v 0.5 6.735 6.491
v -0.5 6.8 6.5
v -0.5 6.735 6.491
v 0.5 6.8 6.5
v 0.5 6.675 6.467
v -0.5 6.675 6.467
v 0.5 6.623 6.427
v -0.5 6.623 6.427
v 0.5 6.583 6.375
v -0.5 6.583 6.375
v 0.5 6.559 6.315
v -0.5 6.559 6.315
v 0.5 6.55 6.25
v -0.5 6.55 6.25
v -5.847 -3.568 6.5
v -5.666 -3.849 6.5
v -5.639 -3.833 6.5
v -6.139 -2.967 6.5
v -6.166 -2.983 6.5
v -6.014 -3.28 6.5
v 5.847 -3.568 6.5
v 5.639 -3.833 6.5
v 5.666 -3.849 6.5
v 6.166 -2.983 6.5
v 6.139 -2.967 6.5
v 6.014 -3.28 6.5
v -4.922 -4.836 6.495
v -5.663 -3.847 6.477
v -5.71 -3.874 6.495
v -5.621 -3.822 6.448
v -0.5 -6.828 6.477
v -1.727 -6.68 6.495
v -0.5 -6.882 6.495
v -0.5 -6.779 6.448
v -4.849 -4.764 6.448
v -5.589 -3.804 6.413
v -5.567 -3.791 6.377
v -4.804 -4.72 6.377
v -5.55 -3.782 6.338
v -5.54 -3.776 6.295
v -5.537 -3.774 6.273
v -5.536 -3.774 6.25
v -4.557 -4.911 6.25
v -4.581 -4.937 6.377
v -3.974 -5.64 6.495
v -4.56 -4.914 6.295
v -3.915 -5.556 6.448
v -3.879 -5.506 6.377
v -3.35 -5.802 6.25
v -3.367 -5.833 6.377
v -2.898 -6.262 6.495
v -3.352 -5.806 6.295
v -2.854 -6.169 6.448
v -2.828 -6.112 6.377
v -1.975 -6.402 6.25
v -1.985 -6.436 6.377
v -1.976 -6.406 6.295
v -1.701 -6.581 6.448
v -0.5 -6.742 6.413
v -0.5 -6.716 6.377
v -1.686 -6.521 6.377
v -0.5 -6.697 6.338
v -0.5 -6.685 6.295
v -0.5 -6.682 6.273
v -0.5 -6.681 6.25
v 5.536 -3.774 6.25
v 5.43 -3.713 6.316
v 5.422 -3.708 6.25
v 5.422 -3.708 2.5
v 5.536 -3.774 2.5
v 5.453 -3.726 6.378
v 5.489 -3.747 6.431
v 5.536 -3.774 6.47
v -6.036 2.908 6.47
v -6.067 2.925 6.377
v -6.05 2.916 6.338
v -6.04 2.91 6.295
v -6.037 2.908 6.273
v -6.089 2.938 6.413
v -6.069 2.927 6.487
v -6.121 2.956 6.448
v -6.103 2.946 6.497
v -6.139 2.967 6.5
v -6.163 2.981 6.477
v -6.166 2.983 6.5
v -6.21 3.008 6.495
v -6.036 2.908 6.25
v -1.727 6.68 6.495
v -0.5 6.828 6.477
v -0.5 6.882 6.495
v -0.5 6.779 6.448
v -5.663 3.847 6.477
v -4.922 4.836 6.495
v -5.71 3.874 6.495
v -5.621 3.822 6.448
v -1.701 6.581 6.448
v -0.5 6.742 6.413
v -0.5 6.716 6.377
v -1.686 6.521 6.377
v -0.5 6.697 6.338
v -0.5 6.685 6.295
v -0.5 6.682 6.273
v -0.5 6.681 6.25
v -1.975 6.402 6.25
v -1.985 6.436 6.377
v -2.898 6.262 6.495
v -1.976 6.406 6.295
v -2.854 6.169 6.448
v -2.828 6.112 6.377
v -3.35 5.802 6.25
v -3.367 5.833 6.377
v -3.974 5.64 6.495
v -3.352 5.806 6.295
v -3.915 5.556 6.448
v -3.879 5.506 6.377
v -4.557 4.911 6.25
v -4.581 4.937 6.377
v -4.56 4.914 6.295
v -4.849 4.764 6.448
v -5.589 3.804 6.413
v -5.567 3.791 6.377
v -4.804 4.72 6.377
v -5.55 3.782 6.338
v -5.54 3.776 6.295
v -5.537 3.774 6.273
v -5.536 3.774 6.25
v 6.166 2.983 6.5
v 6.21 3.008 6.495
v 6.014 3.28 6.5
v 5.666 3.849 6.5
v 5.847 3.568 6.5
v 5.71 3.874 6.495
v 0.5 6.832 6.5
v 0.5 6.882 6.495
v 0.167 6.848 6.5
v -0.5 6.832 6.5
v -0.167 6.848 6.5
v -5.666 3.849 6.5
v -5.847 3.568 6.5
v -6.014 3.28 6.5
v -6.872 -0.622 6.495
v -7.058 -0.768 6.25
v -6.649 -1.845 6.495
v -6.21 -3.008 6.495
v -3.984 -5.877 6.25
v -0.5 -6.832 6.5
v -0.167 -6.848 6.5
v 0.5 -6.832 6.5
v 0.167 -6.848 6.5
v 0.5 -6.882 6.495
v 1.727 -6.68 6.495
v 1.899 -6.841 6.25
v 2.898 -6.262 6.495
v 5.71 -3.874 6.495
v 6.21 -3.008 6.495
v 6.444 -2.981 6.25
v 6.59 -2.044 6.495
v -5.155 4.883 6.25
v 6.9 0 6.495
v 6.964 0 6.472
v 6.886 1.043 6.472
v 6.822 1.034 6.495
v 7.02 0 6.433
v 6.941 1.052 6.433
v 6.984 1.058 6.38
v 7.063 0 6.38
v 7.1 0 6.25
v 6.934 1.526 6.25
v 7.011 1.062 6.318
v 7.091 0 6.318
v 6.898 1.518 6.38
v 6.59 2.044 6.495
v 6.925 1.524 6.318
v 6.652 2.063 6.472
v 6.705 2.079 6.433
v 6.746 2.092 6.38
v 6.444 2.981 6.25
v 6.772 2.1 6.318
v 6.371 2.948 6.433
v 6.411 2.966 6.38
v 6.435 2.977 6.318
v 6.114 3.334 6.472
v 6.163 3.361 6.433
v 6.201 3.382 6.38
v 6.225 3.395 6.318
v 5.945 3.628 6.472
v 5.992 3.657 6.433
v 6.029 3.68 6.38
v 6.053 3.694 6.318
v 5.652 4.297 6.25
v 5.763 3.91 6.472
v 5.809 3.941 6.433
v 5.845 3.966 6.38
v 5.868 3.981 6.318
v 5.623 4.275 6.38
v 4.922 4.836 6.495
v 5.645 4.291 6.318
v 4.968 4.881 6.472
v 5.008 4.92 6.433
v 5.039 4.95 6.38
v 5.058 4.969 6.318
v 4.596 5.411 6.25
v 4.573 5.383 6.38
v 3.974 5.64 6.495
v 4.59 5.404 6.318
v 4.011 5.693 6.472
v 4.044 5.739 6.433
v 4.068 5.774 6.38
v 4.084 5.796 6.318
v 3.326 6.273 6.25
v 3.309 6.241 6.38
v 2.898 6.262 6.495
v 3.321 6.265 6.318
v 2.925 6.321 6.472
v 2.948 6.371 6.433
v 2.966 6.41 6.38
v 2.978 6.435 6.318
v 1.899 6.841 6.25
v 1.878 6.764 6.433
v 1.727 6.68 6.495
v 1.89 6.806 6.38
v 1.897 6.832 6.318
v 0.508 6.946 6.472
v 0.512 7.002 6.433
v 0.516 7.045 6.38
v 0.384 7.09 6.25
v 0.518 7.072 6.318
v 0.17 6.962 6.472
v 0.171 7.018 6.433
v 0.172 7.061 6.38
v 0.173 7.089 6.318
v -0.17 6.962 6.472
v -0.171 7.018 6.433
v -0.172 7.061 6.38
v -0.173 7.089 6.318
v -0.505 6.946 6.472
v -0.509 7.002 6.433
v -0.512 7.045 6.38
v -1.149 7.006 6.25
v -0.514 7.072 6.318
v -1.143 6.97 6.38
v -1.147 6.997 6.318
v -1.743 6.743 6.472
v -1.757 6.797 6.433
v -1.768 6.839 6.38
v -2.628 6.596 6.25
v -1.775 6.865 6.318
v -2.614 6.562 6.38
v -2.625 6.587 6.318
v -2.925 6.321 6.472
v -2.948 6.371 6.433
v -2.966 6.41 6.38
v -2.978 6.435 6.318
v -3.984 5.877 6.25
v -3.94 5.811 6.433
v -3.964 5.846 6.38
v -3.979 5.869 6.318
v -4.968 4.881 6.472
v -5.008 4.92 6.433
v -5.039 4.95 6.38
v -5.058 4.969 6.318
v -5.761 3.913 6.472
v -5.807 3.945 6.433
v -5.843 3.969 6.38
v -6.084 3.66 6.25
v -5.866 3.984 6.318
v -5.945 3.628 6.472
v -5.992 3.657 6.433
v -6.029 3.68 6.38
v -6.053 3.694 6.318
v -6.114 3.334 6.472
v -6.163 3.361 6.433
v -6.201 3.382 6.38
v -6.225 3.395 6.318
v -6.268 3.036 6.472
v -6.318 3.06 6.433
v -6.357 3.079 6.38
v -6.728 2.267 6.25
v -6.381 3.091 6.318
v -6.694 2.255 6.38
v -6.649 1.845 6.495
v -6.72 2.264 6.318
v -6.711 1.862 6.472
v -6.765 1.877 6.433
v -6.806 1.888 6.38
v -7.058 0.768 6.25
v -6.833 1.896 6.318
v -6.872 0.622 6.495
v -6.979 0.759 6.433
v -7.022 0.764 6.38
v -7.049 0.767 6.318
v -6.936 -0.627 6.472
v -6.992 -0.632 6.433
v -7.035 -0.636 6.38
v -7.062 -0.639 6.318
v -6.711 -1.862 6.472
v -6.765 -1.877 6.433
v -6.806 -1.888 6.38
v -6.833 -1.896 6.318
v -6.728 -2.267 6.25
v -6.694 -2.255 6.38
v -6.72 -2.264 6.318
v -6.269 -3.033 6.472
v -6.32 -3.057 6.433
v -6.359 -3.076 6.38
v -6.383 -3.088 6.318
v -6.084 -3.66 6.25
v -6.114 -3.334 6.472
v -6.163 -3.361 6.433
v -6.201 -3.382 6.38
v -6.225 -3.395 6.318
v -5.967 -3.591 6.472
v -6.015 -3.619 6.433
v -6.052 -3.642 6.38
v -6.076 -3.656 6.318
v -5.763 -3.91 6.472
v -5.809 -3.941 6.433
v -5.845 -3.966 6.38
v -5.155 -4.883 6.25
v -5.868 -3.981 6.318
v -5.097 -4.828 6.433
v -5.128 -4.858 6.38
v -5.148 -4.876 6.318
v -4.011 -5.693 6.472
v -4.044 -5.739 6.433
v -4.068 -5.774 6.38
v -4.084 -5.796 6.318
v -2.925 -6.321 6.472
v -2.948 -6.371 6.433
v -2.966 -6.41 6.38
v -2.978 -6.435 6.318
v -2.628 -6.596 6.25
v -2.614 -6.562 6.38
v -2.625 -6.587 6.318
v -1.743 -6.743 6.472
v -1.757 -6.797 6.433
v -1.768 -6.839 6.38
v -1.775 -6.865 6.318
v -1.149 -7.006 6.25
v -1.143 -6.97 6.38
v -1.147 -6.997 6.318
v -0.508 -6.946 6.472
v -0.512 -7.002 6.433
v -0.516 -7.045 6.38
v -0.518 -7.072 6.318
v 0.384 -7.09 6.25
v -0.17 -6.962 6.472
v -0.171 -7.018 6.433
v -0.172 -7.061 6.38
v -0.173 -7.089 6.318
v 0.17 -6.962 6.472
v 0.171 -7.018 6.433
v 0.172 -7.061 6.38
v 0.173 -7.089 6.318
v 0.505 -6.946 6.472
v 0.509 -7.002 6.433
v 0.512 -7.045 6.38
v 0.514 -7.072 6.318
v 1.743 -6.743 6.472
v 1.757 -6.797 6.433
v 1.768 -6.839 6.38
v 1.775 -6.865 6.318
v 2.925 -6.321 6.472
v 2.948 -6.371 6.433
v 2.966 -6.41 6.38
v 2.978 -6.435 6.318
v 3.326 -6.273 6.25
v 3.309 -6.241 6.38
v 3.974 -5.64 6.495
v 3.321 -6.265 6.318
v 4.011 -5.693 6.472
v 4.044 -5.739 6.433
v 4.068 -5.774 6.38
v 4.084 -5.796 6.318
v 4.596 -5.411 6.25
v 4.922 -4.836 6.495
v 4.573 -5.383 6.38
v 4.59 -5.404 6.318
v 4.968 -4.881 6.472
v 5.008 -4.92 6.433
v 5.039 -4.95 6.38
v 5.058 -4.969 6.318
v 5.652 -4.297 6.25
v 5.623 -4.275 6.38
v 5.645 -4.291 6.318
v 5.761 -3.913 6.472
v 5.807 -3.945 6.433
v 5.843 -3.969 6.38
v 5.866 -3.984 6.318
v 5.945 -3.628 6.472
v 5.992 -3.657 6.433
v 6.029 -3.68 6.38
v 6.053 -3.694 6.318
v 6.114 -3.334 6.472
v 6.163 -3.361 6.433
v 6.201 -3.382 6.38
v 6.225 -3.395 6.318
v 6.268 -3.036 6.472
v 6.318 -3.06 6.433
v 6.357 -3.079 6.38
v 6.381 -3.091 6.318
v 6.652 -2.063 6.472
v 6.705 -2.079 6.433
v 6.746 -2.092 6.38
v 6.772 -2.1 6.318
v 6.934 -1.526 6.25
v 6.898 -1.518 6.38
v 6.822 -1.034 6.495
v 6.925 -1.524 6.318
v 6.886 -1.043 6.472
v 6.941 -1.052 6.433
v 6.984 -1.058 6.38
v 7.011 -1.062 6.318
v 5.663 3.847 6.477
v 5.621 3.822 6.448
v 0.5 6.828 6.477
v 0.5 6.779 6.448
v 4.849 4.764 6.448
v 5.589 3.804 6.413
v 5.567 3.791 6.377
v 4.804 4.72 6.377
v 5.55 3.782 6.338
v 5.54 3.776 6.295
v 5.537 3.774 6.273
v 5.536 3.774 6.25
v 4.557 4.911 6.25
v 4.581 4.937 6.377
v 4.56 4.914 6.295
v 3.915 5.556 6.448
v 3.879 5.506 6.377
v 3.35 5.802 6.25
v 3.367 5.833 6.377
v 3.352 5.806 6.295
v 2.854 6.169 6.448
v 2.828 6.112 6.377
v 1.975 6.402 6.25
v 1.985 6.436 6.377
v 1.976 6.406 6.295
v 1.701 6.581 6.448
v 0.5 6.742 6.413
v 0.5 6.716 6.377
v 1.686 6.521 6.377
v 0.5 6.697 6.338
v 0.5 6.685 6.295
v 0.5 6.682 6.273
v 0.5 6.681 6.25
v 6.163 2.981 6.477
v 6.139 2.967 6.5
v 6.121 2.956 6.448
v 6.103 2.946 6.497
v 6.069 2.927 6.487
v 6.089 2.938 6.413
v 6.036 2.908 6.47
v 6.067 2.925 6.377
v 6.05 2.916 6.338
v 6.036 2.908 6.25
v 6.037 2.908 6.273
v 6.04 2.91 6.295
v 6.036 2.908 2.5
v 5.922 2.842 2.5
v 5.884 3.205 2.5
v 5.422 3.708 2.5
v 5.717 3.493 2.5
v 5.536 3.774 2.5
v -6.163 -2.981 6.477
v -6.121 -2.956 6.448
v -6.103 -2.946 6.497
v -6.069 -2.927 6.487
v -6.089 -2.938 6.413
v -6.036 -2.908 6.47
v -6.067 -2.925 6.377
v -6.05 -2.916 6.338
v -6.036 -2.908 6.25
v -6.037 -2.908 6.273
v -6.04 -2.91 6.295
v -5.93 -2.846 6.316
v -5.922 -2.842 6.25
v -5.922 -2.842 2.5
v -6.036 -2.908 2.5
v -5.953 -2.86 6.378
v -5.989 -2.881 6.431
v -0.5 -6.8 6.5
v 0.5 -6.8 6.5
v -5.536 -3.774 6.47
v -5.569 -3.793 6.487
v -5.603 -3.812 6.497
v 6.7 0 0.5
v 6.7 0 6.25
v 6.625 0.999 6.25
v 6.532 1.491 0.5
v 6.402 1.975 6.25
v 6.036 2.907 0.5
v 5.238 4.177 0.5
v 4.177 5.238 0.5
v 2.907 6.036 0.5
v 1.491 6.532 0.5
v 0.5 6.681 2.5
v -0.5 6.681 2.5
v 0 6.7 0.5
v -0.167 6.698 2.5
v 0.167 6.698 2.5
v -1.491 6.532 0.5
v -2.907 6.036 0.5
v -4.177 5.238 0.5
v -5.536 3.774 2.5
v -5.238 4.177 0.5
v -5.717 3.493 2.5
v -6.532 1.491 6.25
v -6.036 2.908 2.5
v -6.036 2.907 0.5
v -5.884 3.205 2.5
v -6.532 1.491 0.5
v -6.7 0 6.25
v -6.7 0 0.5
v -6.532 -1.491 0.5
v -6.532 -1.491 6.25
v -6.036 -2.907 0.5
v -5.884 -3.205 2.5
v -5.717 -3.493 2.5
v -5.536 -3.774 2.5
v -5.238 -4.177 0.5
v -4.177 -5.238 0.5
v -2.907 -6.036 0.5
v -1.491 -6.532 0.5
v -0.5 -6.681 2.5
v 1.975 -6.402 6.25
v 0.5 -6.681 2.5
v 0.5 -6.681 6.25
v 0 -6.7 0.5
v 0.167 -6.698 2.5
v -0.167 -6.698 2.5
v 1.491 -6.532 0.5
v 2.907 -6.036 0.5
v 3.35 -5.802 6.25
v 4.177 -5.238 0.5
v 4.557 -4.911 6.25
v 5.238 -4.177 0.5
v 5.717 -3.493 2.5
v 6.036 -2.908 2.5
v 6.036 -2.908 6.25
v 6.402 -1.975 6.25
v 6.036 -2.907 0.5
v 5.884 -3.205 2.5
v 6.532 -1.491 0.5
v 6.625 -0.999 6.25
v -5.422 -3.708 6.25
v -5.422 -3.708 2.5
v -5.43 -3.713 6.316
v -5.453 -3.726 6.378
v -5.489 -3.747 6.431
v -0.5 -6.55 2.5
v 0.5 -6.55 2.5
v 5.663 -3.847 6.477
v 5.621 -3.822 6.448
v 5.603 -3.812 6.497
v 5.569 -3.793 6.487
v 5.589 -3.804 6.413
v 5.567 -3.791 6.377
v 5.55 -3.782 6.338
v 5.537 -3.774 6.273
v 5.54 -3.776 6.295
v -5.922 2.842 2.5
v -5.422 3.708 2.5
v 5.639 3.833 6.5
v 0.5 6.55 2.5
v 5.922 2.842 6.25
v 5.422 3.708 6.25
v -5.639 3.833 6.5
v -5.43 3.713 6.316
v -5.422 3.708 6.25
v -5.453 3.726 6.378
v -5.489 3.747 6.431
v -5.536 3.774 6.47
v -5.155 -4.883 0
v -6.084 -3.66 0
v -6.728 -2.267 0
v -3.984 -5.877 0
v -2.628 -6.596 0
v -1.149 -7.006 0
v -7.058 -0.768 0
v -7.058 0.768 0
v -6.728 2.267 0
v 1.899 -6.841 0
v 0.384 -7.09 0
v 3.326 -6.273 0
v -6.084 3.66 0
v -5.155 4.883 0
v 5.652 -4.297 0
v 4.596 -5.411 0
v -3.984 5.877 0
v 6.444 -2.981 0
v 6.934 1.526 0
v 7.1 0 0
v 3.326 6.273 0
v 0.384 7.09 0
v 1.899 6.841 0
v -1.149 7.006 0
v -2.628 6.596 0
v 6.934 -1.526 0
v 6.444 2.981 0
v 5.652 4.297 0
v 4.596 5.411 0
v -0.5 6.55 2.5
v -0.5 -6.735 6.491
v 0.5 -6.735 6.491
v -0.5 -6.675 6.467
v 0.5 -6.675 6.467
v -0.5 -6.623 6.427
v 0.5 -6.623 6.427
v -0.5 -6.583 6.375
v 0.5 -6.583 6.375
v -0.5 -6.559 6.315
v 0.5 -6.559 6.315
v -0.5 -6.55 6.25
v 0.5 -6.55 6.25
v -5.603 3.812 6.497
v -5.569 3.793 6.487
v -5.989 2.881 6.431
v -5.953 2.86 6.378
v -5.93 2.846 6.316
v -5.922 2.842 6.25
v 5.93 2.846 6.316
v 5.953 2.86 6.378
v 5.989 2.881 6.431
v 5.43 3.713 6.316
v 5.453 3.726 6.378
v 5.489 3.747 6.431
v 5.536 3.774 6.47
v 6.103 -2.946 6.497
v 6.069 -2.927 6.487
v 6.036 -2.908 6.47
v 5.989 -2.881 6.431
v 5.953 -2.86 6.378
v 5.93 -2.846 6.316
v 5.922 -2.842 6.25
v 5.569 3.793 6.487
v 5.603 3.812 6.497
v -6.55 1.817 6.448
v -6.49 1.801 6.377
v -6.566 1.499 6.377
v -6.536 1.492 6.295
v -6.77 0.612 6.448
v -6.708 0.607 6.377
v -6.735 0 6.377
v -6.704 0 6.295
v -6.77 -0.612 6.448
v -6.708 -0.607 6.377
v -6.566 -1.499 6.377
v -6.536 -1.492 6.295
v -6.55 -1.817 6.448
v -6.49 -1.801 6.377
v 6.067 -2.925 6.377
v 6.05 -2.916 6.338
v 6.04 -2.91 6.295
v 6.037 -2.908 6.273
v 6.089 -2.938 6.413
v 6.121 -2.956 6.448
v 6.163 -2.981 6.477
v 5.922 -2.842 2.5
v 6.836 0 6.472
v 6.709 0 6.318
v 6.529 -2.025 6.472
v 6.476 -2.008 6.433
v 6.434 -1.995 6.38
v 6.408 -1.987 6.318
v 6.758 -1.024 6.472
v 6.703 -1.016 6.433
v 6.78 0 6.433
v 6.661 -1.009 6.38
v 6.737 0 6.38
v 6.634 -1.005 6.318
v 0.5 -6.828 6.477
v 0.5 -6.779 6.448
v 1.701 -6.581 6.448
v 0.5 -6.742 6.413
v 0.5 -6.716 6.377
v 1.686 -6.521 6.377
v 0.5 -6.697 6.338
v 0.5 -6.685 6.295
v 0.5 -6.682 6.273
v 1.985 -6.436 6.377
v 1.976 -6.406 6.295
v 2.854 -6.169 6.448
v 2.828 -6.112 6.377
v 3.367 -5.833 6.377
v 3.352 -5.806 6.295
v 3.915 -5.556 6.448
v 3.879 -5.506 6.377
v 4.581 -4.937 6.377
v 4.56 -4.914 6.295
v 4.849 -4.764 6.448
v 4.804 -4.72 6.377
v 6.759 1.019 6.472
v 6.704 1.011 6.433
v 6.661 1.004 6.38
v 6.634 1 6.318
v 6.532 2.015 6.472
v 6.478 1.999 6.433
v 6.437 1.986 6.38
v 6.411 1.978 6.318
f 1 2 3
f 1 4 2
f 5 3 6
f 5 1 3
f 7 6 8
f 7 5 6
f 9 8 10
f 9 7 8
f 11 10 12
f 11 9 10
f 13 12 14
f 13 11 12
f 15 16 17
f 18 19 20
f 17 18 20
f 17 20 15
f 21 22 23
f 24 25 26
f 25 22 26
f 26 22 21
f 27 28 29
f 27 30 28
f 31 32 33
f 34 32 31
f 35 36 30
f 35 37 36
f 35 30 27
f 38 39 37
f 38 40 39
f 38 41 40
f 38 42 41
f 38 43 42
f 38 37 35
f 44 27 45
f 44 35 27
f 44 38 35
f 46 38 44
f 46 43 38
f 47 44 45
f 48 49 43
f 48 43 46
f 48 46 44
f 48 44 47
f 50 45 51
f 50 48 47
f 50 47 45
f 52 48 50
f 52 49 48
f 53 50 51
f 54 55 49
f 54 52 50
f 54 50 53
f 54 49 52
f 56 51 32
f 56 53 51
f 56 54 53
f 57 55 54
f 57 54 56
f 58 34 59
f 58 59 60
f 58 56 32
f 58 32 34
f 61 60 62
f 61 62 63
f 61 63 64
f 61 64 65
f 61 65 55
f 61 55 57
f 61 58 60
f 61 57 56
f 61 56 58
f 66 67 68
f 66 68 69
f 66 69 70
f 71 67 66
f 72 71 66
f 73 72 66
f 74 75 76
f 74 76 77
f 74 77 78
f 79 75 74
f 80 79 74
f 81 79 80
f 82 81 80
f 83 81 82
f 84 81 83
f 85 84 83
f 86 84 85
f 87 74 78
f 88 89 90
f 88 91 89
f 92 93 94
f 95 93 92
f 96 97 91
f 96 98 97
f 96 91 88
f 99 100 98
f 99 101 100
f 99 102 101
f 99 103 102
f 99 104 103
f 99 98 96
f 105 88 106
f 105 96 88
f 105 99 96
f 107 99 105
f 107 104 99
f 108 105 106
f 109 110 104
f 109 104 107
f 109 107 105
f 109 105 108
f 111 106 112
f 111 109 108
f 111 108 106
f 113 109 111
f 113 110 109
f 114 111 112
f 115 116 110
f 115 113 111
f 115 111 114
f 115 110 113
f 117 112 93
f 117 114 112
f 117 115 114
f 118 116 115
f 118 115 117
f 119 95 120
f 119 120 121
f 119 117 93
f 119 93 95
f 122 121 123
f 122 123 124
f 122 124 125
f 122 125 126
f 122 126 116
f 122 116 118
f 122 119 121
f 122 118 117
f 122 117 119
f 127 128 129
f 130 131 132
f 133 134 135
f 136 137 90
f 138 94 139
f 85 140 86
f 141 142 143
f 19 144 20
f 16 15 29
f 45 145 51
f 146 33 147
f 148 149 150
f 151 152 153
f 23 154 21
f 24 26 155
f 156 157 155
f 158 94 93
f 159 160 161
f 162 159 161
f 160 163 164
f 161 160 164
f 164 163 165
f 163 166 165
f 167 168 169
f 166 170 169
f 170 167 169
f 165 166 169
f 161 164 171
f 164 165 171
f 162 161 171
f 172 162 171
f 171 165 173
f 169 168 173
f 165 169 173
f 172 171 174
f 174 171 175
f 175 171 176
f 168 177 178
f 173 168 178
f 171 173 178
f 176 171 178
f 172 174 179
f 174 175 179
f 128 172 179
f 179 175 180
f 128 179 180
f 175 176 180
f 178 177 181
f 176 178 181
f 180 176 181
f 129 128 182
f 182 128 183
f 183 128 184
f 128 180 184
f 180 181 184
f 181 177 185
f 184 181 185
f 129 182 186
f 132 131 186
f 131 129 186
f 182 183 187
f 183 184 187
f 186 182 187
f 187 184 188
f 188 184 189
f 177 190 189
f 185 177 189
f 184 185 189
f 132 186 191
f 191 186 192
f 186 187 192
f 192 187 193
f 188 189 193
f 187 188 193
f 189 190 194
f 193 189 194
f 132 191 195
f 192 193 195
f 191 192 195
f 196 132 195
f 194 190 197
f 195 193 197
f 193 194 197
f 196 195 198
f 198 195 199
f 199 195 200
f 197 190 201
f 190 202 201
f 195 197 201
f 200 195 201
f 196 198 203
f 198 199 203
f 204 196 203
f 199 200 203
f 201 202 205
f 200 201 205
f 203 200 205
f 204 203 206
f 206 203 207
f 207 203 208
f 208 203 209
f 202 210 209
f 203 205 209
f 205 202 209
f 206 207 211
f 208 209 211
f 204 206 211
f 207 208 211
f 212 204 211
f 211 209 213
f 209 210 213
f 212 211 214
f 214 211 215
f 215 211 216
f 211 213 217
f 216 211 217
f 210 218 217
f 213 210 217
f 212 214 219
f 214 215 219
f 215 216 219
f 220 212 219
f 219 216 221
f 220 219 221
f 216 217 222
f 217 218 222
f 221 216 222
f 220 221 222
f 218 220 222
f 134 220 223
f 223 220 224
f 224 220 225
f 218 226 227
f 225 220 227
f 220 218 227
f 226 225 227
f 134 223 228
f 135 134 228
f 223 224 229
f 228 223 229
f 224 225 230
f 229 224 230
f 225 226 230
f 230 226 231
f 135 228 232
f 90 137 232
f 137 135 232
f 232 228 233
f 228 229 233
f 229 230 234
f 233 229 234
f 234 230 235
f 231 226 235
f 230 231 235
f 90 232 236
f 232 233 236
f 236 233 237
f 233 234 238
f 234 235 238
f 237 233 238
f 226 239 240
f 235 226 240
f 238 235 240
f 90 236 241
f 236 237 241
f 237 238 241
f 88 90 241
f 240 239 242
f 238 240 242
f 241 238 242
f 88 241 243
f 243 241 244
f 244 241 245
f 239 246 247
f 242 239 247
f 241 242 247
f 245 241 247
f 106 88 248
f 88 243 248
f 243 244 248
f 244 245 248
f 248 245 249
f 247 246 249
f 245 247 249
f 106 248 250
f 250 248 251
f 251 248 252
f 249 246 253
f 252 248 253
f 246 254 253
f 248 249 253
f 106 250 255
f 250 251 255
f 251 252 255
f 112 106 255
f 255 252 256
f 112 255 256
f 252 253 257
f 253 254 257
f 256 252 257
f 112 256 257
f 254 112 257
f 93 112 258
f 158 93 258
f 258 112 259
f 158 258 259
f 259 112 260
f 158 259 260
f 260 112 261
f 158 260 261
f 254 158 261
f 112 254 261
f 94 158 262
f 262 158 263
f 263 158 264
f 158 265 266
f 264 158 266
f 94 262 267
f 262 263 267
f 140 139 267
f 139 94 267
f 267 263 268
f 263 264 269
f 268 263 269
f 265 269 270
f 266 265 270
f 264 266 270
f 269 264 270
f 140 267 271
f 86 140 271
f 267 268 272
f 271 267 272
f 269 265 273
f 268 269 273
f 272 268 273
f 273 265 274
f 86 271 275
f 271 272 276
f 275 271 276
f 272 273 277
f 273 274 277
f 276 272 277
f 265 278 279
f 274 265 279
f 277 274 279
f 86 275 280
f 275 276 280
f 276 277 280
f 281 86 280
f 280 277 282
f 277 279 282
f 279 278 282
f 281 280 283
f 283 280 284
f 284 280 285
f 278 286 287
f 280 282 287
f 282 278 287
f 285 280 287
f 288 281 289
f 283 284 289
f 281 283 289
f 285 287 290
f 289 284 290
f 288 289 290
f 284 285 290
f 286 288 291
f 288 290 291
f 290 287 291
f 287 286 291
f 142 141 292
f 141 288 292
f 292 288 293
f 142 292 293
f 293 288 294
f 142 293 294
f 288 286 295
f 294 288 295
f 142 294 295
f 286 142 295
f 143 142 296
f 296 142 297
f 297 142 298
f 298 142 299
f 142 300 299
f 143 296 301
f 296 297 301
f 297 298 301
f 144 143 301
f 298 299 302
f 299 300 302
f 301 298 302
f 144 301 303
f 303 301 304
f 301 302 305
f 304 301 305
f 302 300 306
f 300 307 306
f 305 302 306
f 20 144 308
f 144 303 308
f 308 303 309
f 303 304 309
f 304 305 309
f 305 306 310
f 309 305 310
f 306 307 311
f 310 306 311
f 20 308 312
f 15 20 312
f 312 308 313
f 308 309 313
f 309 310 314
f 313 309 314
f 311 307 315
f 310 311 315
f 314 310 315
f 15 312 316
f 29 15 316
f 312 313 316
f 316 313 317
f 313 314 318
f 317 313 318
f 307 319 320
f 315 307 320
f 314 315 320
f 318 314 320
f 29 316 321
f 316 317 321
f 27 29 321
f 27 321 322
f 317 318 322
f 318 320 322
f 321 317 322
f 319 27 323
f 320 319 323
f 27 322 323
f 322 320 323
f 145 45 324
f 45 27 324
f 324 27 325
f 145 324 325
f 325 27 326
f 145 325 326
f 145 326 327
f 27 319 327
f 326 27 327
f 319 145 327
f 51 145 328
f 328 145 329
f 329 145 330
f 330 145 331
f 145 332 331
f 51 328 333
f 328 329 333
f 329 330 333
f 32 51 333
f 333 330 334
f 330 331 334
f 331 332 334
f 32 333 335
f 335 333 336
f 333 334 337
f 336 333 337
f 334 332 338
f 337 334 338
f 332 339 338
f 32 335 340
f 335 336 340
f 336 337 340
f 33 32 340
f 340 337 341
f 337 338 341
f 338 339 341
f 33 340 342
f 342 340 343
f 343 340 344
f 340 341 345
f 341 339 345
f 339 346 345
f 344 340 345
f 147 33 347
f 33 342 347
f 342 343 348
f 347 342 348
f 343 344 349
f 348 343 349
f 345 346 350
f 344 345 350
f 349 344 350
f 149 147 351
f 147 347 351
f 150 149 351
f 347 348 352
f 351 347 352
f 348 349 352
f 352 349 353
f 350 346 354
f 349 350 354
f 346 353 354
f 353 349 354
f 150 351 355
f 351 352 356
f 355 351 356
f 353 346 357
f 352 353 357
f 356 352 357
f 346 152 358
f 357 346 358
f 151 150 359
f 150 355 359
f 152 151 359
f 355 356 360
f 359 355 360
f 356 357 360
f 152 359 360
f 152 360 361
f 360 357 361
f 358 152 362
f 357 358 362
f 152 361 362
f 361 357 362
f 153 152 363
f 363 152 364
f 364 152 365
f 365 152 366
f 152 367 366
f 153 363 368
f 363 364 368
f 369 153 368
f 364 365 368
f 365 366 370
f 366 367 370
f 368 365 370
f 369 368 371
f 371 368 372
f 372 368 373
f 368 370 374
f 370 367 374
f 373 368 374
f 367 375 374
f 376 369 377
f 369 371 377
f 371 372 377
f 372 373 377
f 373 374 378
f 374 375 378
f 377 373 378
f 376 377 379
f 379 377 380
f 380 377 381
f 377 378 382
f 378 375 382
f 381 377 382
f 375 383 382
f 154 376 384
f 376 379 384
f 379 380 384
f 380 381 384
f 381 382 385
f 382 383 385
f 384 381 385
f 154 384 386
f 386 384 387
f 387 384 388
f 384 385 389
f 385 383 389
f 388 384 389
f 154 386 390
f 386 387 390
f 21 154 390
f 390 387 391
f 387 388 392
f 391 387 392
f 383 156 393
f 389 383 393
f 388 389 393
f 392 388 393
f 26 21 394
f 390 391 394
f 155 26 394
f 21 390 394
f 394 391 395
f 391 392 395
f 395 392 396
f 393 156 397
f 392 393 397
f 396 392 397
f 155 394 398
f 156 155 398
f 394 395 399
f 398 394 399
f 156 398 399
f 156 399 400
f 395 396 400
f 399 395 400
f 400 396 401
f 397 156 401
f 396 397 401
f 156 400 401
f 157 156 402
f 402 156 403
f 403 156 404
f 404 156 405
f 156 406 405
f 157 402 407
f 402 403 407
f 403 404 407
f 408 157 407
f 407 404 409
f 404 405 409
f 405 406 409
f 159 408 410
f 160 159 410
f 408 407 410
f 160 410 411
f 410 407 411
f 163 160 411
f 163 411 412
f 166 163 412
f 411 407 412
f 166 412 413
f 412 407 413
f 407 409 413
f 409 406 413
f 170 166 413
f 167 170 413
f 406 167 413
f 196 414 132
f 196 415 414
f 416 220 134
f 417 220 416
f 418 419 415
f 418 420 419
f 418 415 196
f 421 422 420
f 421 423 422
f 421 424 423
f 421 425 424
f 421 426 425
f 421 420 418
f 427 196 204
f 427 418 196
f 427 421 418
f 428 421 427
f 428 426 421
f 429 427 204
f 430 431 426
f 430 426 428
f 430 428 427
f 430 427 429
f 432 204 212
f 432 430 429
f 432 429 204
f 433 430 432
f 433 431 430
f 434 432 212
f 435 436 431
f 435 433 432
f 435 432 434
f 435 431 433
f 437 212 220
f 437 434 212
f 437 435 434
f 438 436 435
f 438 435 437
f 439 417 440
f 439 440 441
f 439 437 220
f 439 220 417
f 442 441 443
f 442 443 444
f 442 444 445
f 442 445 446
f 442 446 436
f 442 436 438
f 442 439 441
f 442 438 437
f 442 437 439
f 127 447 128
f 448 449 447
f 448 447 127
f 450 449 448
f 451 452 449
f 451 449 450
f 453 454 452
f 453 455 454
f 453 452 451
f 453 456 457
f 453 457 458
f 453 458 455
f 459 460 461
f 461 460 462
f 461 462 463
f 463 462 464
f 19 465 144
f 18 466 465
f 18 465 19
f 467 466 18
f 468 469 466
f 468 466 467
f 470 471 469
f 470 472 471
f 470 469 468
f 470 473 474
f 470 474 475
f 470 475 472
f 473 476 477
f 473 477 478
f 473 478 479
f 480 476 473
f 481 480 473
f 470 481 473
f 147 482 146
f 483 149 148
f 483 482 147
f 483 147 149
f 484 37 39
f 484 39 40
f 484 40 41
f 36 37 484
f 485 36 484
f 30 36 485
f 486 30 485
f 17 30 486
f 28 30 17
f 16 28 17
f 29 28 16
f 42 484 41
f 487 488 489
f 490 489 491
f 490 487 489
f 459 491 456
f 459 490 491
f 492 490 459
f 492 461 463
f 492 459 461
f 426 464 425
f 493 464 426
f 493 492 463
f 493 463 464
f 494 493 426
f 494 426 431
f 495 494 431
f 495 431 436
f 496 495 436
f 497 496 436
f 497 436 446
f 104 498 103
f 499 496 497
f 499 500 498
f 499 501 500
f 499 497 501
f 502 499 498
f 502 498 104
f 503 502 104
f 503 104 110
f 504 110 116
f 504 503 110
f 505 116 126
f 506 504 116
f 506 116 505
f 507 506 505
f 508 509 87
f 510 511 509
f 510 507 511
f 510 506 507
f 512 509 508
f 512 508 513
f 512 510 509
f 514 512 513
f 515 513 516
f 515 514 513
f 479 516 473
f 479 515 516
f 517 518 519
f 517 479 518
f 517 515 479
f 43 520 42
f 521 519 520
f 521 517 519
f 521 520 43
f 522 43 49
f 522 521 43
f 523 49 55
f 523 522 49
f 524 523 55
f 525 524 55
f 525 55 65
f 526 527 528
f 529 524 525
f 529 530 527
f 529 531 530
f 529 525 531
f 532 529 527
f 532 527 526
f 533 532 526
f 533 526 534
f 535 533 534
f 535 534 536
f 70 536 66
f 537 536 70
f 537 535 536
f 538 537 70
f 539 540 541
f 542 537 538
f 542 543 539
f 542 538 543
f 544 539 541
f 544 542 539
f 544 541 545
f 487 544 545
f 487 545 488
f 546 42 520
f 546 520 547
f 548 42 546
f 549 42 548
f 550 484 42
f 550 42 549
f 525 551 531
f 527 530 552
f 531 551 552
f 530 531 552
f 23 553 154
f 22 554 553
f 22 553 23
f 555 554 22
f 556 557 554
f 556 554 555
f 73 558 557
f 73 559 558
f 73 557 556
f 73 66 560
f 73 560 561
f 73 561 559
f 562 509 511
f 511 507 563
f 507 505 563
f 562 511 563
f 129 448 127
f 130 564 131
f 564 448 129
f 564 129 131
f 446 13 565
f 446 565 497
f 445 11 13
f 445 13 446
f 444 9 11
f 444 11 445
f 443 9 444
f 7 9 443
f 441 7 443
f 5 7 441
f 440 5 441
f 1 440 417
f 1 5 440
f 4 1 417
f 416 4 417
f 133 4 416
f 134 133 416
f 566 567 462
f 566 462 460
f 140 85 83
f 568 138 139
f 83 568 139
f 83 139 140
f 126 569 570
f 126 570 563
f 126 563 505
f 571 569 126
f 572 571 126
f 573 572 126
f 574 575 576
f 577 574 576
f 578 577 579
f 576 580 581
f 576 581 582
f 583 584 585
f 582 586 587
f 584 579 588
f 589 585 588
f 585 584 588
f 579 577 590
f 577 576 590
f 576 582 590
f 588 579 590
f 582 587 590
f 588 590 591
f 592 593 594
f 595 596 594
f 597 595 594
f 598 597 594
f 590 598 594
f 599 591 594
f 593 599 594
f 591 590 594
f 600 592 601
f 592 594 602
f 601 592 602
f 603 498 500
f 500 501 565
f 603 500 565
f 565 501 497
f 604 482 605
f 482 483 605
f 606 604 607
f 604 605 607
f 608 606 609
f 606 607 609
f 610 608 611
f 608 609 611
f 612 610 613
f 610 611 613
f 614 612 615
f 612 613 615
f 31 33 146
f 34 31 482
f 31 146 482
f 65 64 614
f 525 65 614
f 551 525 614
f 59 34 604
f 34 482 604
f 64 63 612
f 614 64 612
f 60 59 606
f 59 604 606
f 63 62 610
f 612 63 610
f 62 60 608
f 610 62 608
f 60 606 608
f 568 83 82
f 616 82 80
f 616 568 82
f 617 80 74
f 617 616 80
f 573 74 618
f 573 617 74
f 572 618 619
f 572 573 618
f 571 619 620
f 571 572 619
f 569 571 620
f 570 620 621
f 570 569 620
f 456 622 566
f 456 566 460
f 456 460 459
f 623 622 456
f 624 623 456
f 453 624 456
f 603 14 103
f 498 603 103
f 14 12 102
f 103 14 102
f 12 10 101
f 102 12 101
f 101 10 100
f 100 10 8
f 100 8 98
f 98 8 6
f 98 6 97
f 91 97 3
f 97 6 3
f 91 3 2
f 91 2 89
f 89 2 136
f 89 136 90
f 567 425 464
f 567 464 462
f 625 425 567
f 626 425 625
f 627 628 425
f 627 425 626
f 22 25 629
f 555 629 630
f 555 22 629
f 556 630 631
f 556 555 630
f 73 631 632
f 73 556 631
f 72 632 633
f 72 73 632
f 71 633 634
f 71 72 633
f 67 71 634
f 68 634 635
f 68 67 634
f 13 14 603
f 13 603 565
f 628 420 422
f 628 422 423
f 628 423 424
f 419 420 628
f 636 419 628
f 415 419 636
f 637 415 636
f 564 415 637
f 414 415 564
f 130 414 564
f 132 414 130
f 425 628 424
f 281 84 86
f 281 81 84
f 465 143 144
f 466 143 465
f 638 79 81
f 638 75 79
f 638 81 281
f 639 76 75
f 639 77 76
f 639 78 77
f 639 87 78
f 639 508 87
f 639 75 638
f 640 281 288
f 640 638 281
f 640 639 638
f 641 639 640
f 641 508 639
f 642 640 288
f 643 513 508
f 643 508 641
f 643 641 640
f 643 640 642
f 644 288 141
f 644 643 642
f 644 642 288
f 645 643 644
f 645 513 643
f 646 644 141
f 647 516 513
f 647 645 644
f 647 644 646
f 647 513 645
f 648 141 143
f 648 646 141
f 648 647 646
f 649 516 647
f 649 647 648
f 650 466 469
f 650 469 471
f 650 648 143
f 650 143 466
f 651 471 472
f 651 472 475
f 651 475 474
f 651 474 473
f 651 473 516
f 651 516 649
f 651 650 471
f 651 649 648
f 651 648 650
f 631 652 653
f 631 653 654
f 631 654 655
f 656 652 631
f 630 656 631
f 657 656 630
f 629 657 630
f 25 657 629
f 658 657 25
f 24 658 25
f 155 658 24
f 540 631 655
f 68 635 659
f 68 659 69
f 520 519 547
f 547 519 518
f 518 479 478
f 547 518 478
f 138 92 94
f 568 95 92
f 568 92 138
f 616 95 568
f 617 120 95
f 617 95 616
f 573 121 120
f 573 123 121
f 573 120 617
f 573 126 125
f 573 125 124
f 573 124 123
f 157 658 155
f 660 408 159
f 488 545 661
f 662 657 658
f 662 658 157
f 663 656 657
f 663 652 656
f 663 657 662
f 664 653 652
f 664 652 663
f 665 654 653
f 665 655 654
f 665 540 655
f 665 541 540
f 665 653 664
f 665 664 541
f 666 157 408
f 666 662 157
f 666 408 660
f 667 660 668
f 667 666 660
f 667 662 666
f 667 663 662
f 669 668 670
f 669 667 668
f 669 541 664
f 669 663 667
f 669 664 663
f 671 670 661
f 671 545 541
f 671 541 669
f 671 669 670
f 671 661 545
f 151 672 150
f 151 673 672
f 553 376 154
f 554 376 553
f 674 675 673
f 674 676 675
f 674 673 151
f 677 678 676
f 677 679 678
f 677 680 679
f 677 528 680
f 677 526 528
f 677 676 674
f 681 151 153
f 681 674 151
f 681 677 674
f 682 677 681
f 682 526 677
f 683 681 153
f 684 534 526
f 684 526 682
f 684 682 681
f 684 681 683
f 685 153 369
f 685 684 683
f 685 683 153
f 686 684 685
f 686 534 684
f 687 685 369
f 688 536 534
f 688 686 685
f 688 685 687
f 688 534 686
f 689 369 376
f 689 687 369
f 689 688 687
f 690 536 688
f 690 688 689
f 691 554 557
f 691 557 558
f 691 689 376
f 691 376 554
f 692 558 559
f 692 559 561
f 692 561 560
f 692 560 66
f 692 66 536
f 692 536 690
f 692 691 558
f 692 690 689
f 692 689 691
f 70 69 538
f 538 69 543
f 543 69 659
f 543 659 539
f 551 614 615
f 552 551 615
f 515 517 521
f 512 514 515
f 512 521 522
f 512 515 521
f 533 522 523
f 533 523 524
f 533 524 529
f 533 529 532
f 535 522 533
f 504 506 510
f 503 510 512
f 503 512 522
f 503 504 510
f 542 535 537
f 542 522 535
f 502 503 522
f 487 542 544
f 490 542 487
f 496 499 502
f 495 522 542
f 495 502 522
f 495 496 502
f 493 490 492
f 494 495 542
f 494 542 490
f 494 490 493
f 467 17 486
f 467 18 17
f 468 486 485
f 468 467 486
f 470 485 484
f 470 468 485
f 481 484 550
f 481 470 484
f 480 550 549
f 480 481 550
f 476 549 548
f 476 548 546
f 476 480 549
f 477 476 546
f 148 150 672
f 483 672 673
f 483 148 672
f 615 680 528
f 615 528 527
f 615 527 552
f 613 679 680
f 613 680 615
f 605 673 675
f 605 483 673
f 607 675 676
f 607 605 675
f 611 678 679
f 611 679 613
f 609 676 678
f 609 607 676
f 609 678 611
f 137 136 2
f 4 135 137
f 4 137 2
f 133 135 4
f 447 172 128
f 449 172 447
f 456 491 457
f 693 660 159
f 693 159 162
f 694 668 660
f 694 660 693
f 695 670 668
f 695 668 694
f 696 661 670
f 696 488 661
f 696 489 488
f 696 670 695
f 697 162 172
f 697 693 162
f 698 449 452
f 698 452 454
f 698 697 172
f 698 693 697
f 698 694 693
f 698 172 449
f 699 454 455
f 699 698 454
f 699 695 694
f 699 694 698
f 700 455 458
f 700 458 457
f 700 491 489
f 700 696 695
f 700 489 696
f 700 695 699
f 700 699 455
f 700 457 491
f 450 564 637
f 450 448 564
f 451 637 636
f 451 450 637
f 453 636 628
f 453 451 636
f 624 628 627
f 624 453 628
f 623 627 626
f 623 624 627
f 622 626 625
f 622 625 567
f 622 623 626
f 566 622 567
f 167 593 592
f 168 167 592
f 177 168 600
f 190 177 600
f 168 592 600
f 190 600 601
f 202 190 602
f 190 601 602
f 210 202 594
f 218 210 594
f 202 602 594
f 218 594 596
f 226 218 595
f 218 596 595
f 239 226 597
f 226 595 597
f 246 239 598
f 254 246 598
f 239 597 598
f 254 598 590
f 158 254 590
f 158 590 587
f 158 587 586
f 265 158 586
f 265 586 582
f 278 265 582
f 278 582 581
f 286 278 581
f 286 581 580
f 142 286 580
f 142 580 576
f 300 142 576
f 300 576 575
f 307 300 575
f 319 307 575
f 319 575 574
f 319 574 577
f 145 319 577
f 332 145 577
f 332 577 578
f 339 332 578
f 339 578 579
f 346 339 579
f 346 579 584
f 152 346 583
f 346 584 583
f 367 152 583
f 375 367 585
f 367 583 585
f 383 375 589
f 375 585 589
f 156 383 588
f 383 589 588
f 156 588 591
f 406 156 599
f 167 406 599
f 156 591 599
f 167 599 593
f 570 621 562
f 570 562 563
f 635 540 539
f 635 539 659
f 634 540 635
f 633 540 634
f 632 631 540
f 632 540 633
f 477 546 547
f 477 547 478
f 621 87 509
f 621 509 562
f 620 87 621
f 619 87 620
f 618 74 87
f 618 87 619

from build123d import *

# Parameters (mm, degrees)
F0_R         = 7.1
F1_DEPTH     = 0.5
F2_R         = 7.1
F2_R_2       = 6.7
F3_DEPTH     = 6
F4_W         = 1
F4_H         = 0.3
F5_DEPTH     = 4
F6_R         = 0.25
F7_T4_ANGLE  = 62.1313472273
F7_T10_ANGLE = 62.1313472273
F7_T16_ANGLE = 62.1313472273
F7_T22_ANGLE = 62.1313472273
F7_T28_ANGLE = 31.0651476548
F7_T33_ANGLE = 62.1313472273
F7_T39_ANGLE = 31.0651476548
F8_R         = 0.25


# Not quite as in the source:
# - a fillet or chamfer that OpenCascade refuses, or shapes differently, is made with other operations: its cross-section is extruded or revolved along the edge and cut away or added


with BuildPart() as f1:
    # F0 (on Top) → F1 (new body)
    with BuildSketch(Plane.XY):
        Circle(F0_R)
    extrude(amount=F1_DEPTH)

    # F2 (on face) → F3 (join)
    with BuildSketch(Plane.XY.offset(0.5)):
        Circle(F2_R)
        Circle(F2_R_2, mode=Mode.SUBTRACT)
    extrude(amount=F3_DEPTH)

    # F4 (on face) → F5 (join)
    with BuildSketch(Plane.XY.offset(6.5)):
        with Locations((0, 6.7)):
            Rectangle(F4_W, F4_H)
        Polygon((-5.9224663948, 2.8419872981), (-5.4224663948, 3.7080127019), (-5.6822740159, 3.8580127019), (-6.1822740159, 2.9919872981), align=None)
        Polygon((-5.4224663948, -3.7080127019), (-5.9224663948, -2.8419872981), (-6.1822740159, -2.9919872981), (-5.6822740159, -3.8580127019), align=None)
        with Locations((0, -6.7)):
            Rectangle(F4_W, F4_H)
        Polygon((5.9224663948, -2.8419872981), (5.4224663948, -3.7080127019), (5.6822740159, -3.8580127019), (6.1822740159, -2.9919872981), align=None)
        Polygon((5.4224663948, 3.7080127019), (5.9224663948, 2.8419872981), (6.1822740159, 2.9919872981), (5.6822740159, 3.8580127019), align=None)
    extrude(amount=-F5_DEPTH)

    # F6
    f6_edges = [f1.edges().sort_by_distance(p)[0] for p in [
        (-7.1, 0, 6.5),
    ]]
    fillet(f6_edges, radius=F6_R)

    # F7: fillet of radius 0.25 on 6 edges, made by hand


with BuildPart() as f7_tool2:
    # F7_s3 → F7_t4 (revolve)
    with BuildSketch(Plane(origin=(0, 0, 0), x_dir=(0, 0, 1), z_dir=(-0.4838067947, 0.8751748313, 0))):
        with BuildLine():
            ThreePointArc((6.5, -6.95), (6.4267766953, -6.7732233047), (6.25, -6.7))
            Line((6.25, -6.7), (6.5, -6.7))
            Line((6.5, -6.7), (6.5, -6.95))
        make_face()
    revolve(axis=Axis((0, 0, 6.5), (0, 0, 1)), revolution_arc=F7_T4_ANGLE)

    split(bisect_by=Plane.YZ.offset(-0.5), keep=Keep.BOTTOM)

    split(bisect_by=Plane(origin=(0.25, -0.4330127019, 0), x_dir=(0, 0, 1), z_dir=(0.5, -0.8660254038, 0)), keep=Keep.TOP)


with BuildPart() as f1_1:
    add(f1.part)

    # F7_t1: cut F7_tool2
    add(f7_tool2.part, mode=Mode.SUBTRACT)


with BuildPart() as f7_tool8:
    # F7_s9 → F7_t10 (revolve)
    with BuildSketch(Plane(origin=(0, 0, 0), x_dir=(0, 0, 1), z_dir=(0.5160202393, 0.8565763904, 0))):
        with BuildLine():
            ThreePointArc((6.5, -6.95), (6.4267766953, -6.7732233047), (6.25, -6.7))
            Line((6.25, -6.7), (6.5, -6.7))
            Line((6.5, -6.7), (6.5, -6.95))
        make_face()
    revolve(axis=Axis((0, 0, 6.5), (0, 0, 1)), revolution_arc=F7_T10_ANGLE)

    split(bisect_by=Plane(origin=(-0.25, 0.4330127019, 0), x_dir=(0, 0, 1), z_dir=(-0.5, 0.8660254038, 0)), keep=Keep.TOP)

    split(bisect_by=Plane(origin=(-0.25, -0.4330127019, 0), x_dir=(0, 0, 1), z_dir=(-0.5, -0.8660254038, 0)), keep=Keep.TOP)


with BuildPart() as f1_2:
    add(f1_1.part)

    # F7_t7: cut F7_tool8
    add(f7_tool8.part, mode=Mode.SUBTRACT)


with BuildPart() as f7_tool14:
    # F7_s15 → F7_t16 (revolve)
    with BuildSketch(Plane(origin=(0, 0, 0), x_dir=(0, 0, 1), z_dir=(0.999827034, -0.0185984409, 0))):
        with BuildLine():
            ThreePointArc((6.5, -6.95), (6.4267766953, -6.7732233047), (6.25, -6.7))
            Line((6.25, -6.7), (6.5, -6.7))
            Line((6.5, -6.7), (6.5, -6.95))
        make_face()
    revolve(axis=Axis((0, 0, 6.5), (0, 0, 1)), revolution_arc=F7_T16_ANGLE)

    split(bisect_by=Plane(origin=(0.25, 0.4330127019, 0), x_dir=(0, 0, 1), z_dir=(0.5, 0.8660254038, 0)), keep=Keep.TOP)

    split(bisect_by=Plane.YZ.offset(-0.5), keep=Keep.BOTTOM)


with BuildPart() as f1_3:
    add(f1_2.part)

    # F7_t13: cut F7_tool14
    add(f7_tool14.part, mode=Mode.SUBTRACT)


with BuildPart() as f7_tool20:
    # F7_s21 → F7_t22 (revolve)
    with BuildSketch(Plane(origin=(0, 0, 0), x_dir=(0, 0, 1), z_dir=(0.4838067947, -0.8751748313, 0))):
        with BuildLine():
            ThreePointArc((6.5, -6.95), (6.4267766953, -6.7732233047), (6.25, -6.7))
            Line((6.25, -6.7), (6.5, -6.7))
            Line((6.5, -6.7), (6.5, -6.95))
        make_face()
    revolve(axis=Axis((0, 0, 6.5), (0, 0, 1)), revolution_arc=F7_T22_ANGLE)

    split(bisect_by=Plane.YZ.offset(0.5), keep=Keep.TOP)

    split(bisect_by=Plane(origin=(-0.25, 0.4330127019, 0), x_dir=(0, 0, 1), z_dir=(-0.5, 0.8660254038, 0)), keep=Keep.TOP)


with BuildPart() as f1_4:
    add(f1_3.part)

    # F7_t19: cut F7_tool20
    add(f7_tool20.part, mode=Mode.SUBTRACT)


with BuildPart() as f7_tool26:
    # F7_s27 → F7_t28 (revolve)
    with BuildSketch(Plane(origin=(0, 0, 0), x_dir=(0, 0, 1), z_dir=(-0.5160123762, -0.8565811273, 0))):
        with BuildLine():
            ThreePointArc((6.5, -6.95), (6.4267766953, -6.7732233047), (6.25, -6.7))
            Line((6.25, -6.7), (6.5, -6.7))
            Line((6.5, -6.7), (6.5, -6.95))
        make_face()
    revolve(axis=Axis((0, 0, 6.5), (0, 0, 1)), revolution_arc=F7_T28_ANGLE)

    split(bisect_by=Plane(origin=(0.25, 0.4330127019, 0), x_dir=(0, 0, 1), z_dir=(0.5, 0.8660254038, 0)), keep=Keep.TOP)


with BuildPart() as f1_5:
    add(f1_4.part)

    # F7_t25: cut F7_tool26
    add(f7_tool26.part, mode=Mode.SUBTRACT)


with BuildPart() as f7_tool31:
    # F7_s32 → F7_t33 (revolve)
    with BuildSketch(Plane(origin=(0, 0, 0), x_dir=(0, 0, 1), z_dir=(-0.999827034, 0.0185984409, 0))):
        with BuildLine():
            ThreePointArc((6.5, -6.95), (6.4267766953, -6.7732233047), (6.25, -6.7))
            Line((6.25, -6.7), (6.5, -6.7))
            Line((6.5, -6.7), (6.5, -6.95))
        make_face()
    revolve(axis=Axis((0, 0, 6.5), (0, 0, 1)), revolution_arc=F7_T33_ANGLE)

    split(bisect_by=Plane(origin=(-0.25, -0.4330127019, 0), x_dir=(0, 0, 1), z_dir=(-0.5, -0.8660254038, 0)), keep=Keep.TOP)

    split(bisect_by=Plane.YZ.offset(0.5), keep=Keep.TOP)


with BuildPart() as f1_6:
    add(f1_5.part)

    # F7_t30: cut F7_tool31
    add(f7_tool31.part, mode=Mode.SUBTRACT)


with BuildPart() as f7_tool37:
    # F7_s38 → F7_t39 (revolve)
    with BuildSketch(Plane.XZ):
        with BuildLine():
            ThreePointArc((6.95, 6.5), (6.7732233047, 6.4267766953), (6.7, 6.25))
            Line((6.7, 6.25), (6.7, 6.5))
            Line((6.7, 6.5), (6.95, 6.5))
        make_face()
    revolve(axis=Axis((0, 0, 6.5), (0, 0, 1)), revolution_arc=F7_T39_ANGLE)

    split(bisect_by=Plane(origin=(0.25, -0.4330127019, 0), x_dir=(0, 0, 1), z_dir=(0.5, -0.8660254038, 0)), keep=Keep.TOP)


with BuildPart() as f1_7:
    add(f1_6.part)

    # F7_t36: cut F7_tool37
    add(f7_tool37.part, mode=Mode.SUBTRACT)

    # F8
    f8_edges = [f1_7.edges().sort_by_distance(p)[0] for p in [
        (-5.672466, 3.275, 6.5),
        (0, 6.55, 6.5),
        (5.672466, 3.275, 6.5),
        (5.672466, -3.275, 6.5),
        (0, -6.55, 6.5),
        (-5.672466, -3.275, 6.5),
    ]]
    fillet(f8_edges, radius=F8_R)


solid = f1_7.part
